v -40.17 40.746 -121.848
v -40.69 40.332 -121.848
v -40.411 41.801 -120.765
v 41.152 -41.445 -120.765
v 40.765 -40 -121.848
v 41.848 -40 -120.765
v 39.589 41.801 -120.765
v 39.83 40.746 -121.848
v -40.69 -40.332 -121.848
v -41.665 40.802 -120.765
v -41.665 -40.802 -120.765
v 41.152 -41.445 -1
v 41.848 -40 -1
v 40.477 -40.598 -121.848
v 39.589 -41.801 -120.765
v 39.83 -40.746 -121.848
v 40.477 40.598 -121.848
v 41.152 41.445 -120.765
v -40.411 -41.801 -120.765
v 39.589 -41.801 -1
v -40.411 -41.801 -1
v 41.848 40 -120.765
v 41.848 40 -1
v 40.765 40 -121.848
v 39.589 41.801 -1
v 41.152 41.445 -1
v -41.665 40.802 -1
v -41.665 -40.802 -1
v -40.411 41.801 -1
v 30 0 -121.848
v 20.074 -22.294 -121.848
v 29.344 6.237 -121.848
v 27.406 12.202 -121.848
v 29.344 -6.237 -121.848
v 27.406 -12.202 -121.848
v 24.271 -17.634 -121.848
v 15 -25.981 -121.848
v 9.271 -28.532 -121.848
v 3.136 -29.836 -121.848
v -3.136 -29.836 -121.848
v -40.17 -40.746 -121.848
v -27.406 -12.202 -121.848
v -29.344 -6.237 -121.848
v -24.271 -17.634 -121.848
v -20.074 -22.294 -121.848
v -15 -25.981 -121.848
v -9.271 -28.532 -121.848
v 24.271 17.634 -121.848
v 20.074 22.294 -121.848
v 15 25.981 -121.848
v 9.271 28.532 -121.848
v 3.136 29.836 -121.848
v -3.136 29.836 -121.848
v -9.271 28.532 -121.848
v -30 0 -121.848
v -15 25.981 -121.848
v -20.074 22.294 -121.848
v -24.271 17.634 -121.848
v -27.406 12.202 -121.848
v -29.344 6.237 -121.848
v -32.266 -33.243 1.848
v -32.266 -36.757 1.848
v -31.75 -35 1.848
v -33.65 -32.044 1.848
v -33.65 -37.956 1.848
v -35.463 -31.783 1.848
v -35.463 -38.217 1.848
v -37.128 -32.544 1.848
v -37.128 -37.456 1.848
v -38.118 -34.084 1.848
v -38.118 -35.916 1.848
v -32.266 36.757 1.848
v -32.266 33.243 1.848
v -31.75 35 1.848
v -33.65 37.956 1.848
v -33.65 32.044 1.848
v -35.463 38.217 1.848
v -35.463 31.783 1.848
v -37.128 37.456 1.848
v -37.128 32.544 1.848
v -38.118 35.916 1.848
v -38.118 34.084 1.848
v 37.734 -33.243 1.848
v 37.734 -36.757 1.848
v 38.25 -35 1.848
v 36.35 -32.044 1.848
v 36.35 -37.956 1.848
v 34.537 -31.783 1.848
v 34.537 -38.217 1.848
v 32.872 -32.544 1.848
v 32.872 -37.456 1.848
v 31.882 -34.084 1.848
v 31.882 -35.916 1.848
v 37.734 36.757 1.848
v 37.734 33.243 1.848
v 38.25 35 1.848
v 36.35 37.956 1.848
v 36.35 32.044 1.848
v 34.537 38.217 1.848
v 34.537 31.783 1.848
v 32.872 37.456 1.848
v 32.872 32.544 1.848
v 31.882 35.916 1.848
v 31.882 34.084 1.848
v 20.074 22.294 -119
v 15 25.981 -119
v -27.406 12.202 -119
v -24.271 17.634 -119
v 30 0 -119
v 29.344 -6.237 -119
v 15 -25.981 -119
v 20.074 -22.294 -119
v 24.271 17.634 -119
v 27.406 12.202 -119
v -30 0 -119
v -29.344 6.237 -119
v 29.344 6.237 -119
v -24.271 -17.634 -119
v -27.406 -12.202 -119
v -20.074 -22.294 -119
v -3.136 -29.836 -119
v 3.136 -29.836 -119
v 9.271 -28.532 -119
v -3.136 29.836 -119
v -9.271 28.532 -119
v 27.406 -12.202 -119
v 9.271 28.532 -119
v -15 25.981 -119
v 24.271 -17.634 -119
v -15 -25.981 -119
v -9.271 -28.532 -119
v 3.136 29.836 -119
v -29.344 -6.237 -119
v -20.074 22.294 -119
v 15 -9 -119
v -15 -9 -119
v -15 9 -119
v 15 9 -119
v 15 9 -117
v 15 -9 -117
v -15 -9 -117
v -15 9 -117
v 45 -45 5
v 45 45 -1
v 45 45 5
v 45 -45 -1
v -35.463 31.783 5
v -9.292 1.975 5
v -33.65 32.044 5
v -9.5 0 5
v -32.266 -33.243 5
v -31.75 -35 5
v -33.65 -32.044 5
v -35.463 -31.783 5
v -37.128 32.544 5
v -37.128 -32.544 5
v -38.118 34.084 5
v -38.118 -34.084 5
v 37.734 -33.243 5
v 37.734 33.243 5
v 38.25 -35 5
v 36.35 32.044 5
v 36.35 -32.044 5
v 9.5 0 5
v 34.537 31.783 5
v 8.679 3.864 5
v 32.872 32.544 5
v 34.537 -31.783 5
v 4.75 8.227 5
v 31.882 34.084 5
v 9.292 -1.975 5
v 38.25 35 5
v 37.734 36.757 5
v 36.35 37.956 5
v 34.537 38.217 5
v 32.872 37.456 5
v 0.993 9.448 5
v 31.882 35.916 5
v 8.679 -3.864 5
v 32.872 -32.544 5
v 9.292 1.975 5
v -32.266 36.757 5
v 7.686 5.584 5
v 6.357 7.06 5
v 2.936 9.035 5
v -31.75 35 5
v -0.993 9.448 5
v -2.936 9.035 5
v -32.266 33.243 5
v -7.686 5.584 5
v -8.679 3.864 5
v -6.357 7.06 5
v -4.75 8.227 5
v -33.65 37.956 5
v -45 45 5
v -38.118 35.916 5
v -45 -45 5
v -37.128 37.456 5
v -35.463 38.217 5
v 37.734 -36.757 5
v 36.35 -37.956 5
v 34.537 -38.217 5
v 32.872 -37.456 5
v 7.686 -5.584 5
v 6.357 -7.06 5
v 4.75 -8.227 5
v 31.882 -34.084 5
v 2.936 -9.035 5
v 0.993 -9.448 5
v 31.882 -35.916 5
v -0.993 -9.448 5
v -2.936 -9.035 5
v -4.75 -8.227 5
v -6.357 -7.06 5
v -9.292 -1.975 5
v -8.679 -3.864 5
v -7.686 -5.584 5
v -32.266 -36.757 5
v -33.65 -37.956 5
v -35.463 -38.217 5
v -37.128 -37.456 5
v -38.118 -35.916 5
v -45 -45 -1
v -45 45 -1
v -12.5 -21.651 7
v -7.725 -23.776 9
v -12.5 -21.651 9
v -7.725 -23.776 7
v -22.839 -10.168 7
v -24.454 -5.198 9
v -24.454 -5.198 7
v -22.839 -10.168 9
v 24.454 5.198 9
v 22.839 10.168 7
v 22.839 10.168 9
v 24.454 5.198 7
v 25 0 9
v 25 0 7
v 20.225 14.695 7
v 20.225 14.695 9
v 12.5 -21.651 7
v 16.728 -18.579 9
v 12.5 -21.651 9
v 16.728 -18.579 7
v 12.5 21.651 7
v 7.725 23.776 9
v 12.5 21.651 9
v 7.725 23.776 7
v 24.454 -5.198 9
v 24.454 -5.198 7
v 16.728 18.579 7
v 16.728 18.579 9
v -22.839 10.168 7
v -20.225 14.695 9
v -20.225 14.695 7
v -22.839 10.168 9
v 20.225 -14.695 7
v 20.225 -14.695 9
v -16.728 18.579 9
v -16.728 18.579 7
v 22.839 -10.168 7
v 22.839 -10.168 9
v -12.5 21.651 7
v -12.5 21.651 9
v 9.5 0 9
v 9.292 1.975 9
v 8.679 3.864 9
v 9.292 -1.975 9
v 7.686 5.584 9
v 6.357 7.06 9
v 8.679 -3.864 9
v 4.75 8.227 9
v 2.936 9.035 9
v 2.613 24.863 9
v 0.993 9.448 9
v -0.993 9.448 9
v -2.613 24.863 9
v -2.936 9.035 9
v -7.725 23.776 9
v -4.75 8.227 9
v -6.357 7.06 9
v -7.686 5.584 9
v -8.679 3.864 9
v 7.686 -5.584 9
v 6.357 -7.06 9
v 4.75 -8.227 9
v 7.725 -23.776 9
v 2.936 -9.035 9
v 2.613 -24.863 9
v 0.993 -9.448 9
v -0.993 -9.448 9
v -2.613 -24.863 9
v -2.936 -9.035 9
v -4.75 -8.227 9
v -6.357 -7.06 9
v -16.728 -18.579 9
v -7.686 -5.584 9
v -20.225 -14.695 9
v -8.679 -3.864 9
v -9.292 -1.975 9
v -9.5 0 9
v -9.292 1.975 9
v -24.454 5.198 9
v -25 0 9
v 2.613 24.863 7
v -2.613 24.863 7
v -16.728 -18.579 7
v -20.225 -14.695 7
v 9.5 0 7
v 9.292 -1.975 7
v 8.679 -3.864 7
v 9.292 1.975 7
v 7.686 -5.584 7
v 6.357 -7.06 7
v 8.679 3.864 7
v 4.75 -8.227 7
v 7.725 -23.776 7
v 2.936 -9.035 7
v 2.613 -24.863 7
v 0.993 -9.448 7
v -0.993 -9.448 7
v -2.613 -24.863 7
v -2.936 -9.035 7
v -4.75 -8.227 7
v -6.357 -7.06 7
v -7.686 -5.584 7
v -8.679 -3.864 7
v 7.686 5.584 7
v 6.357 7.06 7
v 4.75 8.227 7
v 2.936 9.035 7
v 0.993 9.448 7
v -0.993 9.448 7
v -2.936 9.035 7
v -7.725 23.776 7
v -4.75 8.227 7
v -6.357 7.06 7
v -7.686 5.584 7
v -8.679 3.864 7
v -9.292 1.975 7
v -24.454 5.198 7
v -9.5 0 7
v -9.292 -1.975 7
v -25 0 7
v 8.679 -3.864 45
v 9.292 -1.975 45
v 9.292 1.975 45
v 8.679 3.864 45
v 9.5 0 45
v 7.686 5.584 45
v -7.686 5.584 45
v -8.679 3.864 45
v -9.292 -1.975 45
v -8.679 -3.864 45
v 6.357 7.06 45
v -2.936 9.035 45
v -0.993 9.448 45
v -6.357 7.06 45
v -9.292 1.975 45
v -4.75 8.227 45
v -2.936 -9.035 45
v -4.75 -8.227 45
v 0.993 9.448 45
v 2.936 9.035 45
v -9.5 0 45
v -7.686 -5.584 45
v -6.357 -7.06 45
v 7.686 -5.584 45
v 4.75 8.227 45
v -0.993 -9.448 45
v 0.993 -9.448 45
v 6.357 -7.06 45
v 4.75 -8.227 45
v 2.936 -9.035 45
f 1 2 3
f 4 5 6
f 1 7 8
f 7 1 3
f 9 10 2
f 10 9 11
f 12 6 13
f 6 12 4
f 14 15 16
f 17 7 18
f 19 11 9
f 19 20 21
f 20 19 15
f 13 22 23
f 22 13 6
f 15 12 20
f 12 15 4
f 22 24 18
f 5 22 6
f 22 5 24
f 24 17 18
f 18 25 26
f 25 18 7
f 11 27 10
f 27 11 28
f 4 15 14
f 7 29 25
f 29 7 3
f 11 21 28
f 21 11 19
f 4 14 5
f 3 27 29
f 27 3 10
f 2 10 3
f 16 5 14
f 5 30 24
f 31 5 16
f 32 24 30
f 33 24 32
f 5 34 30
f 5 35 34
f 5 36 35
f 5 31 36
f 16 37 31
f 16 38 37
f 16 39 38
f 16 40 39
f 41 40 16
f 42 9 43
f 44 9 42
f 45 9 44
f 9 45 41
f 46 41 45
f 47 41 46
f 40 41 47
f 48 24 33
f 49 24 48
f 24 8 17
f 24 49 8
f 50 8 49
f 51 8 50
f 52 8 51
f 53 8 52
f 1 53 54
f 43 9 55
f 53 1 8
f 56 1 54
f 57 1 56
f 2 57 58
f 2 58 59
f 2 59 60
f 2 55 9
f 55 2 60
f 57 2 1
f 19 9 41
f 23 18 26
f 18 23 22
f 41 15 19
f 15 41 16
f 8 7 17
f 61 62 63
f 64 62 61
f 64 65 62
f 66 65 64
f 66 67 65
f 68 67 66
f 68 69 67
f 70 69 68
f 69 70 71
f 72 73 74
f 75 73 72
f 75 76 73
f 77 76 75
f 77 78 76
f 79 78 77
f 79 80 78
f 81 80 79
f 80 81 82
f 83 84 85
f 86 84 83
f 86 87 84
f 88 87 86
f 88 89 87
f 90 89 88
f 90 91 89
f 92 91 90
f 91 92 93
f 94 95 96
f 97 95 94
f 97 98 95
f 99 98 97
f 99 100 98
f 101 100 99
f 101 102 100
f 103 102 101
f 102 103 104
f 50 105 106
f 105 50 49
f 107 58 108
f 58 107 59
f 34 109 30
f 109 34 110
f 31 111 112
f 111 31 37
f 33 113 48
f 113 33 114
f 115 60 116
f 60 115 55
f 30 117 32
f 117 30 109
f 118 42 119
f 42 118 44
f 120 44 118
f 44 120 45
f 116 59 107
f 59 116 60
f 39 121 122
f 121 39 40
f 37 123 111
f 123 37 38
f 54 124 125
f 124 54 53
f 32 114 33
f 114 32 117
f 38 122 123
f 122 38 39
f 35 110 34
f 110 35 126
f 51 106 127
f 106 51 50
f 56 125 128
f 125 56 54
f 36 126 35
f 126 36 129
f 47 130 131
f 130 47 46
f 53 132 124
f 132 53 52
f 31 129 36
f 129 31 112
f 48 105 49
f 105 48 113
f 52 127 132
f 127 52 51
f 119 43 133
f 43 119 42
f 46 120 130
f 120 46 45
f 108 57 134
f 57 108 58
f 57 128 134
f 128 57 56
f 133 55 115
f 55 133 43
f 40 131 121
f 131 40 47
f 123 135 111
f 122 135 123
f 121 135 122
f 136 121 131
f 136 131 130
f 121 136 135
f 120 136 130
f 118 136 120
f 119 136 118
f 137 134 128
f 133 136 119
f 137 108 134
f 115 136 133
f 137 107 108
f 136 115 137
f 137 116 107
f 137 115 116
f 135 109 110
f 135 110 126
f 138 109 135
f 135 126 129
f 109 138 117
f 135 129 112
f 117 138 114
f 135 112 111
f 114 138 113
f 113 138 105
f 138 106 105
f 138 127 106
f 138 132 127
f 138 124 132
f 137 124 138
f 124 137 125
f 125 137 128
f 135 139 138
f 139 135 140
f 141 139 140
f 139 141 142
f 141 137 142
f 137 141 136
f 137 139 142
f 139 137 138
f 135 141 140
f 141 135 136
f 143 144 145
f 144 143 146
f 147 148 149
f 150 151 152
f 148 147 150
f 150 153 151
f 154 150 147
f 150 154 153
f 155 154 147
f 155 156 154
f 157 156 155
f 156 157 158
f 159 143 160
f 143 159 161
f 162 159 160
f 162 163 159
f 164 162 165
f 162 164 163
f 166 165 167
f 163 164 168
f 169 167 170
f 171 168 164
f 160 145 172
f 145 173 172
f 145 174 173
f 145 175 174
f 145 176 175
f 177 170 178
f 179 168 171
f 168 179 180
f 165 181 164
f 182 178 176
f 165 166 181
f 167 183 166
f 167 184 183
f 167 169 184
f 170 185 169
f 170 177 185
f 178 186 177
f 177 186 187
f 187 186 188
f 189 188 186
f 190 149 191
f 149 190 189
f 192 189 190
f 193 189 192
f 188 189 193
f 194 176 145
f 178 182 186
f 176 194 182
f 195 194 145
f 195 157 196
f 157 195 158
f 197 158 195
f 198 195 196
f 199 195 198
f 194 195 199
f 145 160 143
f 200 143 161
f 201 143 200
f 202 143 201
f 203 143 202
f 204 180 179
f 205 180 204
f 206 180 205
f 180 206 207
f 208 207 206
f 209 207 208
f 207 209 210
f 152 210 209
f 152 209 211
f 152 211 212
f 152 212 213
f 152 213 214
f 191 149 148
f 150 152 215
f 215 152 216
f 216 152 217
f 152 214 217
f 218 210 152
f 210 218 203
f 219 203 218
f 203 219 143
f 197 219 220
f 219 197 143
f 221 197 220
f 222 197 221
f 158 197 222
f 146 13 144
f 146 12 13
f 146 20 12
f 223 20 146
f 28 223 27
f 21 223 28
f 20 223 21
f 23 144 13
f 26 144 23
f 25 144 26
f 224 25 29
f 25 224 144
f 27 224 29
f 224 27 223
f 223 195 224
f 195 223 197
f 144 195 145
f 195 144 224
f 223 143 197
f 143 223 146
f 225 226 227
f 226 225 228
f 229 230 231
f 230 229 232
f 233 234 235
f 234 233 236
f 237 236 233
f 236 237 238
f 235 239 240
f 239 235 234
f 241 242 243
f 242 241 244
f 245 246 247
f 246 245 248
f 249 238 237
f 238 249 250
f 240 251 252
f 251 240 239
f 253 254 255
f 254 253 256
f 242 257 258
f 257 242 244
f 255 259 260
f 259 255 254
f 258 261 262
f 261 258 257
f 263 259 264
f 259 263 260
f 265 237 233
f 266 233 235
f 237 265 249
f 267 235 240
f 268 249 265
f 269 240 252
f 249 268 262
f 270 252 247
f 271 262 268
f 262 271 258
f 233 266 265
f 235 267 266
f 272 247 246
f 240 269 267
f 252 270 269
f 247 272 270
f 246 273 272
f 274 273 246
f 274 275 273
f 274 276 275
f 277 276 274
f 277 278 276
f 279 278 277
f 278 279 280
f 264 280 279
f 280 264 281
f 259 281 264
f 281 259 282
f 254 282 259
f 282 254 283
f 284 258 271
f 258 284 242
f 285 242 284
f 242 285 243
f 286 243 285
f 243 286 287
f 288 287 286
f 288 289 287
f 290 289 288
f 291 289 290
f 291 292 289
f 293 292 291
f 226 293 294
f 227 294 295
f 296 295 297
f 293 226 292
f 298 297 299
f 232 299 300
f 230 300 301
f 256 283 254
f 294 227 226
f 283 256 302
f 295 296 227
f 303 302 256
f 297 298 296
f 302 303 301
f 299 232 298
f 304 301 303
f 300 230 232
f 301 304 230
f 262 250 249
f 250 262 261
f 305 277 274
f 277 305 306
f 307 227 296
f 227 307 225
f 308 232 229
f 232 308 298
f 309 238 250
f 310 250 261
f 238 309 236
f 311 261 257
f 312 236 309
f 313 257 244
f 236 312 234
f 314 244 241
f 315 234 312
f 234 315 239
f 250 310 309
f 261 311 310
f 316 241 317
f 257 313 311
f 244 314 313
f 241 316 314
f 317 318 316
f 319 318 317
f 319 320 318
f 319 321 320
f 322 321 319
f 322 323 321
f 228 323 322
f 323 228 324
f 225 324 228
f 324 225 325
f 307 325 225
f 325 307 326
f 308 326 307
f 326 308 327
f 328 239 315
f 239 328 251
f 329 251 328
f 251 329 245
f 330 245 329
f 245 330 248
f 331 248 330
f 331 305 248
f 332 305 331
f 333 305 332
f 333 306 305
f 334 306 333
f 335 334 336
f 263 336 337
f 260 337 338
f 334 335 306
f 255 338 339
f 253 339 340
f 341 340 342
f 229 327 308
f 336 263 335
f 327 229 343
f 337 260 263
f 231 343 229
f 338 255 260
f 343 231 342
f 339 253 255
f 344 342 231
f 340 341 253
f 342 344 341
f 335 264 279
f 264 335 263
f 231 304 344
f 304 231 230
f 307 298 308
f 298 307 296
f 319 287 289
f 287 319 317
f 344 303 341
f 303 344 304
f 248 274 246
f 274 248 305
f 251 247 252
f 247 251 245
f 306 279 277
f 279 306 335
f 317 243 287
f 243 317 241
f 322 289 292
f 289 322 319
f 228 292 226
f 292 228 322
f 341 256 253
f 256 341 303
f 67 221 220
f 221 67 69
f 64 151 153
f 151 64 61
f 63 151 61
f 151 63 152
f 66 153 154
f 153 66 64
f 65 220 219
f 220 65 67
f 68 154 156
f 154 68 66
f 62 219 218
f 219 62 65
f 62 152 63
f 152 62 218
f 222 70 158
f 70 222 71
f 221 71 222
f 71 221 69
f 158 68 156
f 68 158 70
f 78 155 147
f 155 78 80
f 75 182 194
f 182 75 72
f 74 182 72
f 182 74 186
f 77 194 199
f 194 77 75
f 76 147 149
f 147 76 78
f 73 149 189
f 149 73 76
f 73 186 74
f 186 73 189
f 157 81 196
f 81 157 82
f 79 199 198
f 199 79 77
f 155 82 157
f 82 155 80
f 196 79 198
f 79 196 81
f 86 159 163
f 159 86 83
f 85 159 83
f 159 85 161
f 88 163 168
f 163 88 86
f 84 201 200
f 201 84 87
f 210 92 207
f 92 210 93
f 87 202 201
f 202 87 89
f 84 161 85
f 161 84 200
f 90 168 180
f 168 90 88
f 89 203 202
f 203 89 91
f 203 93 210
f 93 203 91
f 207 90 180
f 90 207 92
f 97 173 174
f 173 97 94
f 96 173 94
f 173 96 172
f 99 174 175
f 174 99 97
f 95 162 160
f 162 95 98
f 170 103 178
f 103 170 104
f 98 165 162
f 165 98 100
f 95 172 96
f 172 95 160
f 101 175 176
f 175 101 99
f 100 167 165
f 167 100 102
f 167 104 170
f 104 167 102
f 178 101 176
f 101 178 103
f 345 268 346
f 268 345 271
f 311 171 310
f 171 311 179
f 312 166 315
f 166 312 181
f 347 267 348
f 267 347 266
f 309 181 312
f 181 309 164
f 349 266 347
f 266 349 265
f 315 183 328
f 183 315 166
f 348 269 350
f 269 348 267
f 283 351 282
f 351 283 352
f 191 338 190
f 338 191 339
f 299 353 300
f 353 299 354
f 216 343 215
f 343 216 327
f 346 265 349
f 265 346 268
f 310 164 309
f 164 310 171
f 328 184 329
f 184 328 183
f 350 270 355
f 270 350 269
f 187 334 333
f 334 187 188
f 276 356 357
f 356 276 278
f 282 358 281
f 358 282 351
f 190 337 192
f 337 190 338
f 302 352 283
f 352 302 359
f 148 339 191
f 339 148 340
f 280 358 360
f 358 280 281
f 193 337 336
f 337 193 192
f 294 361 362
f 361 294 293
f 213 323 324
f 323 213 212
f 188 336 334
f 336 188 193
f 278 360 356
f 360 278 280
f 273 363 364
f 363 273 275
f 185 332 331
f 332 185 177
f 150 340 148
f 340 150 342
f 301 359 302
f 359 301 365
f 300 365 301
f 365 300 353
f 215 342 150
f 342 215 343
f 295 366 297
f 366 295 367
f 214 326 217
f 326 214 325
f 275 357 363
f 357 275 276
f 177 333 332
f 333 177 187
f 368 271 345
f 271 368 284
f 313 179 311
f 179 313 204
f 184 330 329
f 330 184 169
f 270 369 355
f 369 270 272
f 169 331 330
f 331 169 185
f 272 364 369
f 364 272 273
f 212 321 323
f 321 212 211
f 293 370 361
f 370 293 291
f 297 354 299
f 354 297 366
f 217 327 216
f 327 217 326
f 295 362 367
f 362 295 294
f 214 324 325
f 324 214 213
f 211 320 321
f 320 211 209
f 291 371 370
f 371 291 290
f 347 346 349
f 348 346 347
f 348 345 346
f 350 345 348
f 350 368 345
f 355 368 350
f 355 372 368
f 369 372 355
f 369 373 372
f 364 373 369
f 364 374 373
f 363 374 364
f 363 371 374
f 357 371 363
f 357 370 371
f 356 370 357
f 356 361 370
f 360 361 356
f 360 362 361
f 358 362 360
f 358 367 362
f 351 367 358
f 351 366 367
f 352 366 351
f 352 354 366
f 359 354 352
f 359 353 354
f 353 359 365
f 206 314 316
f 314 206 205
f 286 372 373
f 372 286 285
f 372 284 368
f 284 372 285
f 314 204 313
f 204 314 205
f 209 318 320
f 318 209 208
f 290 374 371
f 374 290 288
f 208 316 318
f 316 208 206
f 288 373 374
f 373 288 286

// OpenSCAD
// Parameters
motor_frame_size_mm = 80; //[40:160:1]
body_length_mm = 120; //[60:240:1]
body_corner_radius_mm = 2; //[1:6:1]
flange_size_mm = 90; //[60:140:1]
flange_thickness_mm = 6; //[3:15:1]
pilot_diameter_mm = 50; //[25:100:1]
pilot_depth_mm = 2; //[1:8:1]
mount_hole_pitch_mm = 70; //[40:120:1]
mount_hole_diameter_mm = 6.5; //[3:12:0.1]
mount_hole_through_extra_mm = 2; //[1:10:1]
shaft_diameter_mm = 19; //[8:40:0.5]
shaft_length_mm = 40; //[15:100:1]
shaft_flat_depth_mm = 1.0; //[0.5:4:0.1]
shaft_flat_length_mm = 25; //[10:80:1]
rear_cap_diameter_mm = 60; //[30:120:1]
rear_cap_length_mm = 10; //[5:30:1]
rear_connector_width_mm = 30; //[15:60:1]
rear_connector_height_mm = 18; //[10:40:1]
rear_connector_length_mm = 12; //[6:40:1]
overlap_mm = 1; //[0.5:2:0.5]

// Servo Motor - complete geometry
module servo_motor() {
  color([0.15, 0.2, 0.35]) {
    // Motor Body with rounded corners
    difference() {
      minkowski() {
        translate([0, 0, -(body_length_mm/2)])
          cube([motor_frame_size_mm, motor_frame_size_mm, body_length_mm], center=true);
        sphere(r=body_corner_radius_mm, center=true);
      }
      // Rear Cap
      translate([0, 0, -body_length_mm - rear_cap_length_mm/2 + overlap_mm])
        cylinder(r=rear_cap_diameter_mm/2, h=rear_cap_length_mm, center=true);
      // Rear Connector Boss
      translate([0, 0, -body_length_mm - rear_cap_length_mm + rear_connector_length_mm/2 + overlap_mm])
        cube([rear_connector_width_mm, rear_connector_height_mm, rear_connector_length_mm], center=true);
    }
    
    // Front Flange with Pilot
    translate([0, 0, flange_thickness_mm/2 - overlap_mm])
      difference() {
        union() {
          cube([flange_size_mm, flange_size_mm, flange_thickness_mm], center=true);
          translate([0, 0, flange_thickness_mm - overlap_mm + pilot_depth_mm/2])
            cylinder(r=pilot_diameter_mm/2, h=pilot_depth_mm, center=true);
        }
        // Mounting Holes
        for (x = [-1, 1], y = [-1, 1]) {
          translate([x * mount_hole_pitch_mm/2, y * mount_hole_pitch_mm/2, flange_thickness_mm/2 - overlap_mm])
            cylinder(r=mount_hole_diameter_mm/2, h=flange_thickness_mm + mount_hole_through_extra_mm, center=true);
        }
      }
    
    // Output Shaft with Flat
    translate([0, 0, flange_thickness_mm + shaft_length_mm/2 - overlap_mm])
      difference() {
        cylinder(r=shaft_diameter_mm/2, h=shaft_length_mm, center=true);
        translate([(shaft_diameter_mm/2 - shaft_flat_depth_mm) + (shaft_diameter_mm*2)/2, 0, flange_thickness_mm + shaft_length_mm - shaft_flat_length_mm/2])
          cube([shaft_diameter_mm*2, shaft_diameter_mm*2, shaft_flat_length_mm], center=true);
      }
  }
}

// Assembly
module assembly() {
  servo_motor();
}

assembly();
